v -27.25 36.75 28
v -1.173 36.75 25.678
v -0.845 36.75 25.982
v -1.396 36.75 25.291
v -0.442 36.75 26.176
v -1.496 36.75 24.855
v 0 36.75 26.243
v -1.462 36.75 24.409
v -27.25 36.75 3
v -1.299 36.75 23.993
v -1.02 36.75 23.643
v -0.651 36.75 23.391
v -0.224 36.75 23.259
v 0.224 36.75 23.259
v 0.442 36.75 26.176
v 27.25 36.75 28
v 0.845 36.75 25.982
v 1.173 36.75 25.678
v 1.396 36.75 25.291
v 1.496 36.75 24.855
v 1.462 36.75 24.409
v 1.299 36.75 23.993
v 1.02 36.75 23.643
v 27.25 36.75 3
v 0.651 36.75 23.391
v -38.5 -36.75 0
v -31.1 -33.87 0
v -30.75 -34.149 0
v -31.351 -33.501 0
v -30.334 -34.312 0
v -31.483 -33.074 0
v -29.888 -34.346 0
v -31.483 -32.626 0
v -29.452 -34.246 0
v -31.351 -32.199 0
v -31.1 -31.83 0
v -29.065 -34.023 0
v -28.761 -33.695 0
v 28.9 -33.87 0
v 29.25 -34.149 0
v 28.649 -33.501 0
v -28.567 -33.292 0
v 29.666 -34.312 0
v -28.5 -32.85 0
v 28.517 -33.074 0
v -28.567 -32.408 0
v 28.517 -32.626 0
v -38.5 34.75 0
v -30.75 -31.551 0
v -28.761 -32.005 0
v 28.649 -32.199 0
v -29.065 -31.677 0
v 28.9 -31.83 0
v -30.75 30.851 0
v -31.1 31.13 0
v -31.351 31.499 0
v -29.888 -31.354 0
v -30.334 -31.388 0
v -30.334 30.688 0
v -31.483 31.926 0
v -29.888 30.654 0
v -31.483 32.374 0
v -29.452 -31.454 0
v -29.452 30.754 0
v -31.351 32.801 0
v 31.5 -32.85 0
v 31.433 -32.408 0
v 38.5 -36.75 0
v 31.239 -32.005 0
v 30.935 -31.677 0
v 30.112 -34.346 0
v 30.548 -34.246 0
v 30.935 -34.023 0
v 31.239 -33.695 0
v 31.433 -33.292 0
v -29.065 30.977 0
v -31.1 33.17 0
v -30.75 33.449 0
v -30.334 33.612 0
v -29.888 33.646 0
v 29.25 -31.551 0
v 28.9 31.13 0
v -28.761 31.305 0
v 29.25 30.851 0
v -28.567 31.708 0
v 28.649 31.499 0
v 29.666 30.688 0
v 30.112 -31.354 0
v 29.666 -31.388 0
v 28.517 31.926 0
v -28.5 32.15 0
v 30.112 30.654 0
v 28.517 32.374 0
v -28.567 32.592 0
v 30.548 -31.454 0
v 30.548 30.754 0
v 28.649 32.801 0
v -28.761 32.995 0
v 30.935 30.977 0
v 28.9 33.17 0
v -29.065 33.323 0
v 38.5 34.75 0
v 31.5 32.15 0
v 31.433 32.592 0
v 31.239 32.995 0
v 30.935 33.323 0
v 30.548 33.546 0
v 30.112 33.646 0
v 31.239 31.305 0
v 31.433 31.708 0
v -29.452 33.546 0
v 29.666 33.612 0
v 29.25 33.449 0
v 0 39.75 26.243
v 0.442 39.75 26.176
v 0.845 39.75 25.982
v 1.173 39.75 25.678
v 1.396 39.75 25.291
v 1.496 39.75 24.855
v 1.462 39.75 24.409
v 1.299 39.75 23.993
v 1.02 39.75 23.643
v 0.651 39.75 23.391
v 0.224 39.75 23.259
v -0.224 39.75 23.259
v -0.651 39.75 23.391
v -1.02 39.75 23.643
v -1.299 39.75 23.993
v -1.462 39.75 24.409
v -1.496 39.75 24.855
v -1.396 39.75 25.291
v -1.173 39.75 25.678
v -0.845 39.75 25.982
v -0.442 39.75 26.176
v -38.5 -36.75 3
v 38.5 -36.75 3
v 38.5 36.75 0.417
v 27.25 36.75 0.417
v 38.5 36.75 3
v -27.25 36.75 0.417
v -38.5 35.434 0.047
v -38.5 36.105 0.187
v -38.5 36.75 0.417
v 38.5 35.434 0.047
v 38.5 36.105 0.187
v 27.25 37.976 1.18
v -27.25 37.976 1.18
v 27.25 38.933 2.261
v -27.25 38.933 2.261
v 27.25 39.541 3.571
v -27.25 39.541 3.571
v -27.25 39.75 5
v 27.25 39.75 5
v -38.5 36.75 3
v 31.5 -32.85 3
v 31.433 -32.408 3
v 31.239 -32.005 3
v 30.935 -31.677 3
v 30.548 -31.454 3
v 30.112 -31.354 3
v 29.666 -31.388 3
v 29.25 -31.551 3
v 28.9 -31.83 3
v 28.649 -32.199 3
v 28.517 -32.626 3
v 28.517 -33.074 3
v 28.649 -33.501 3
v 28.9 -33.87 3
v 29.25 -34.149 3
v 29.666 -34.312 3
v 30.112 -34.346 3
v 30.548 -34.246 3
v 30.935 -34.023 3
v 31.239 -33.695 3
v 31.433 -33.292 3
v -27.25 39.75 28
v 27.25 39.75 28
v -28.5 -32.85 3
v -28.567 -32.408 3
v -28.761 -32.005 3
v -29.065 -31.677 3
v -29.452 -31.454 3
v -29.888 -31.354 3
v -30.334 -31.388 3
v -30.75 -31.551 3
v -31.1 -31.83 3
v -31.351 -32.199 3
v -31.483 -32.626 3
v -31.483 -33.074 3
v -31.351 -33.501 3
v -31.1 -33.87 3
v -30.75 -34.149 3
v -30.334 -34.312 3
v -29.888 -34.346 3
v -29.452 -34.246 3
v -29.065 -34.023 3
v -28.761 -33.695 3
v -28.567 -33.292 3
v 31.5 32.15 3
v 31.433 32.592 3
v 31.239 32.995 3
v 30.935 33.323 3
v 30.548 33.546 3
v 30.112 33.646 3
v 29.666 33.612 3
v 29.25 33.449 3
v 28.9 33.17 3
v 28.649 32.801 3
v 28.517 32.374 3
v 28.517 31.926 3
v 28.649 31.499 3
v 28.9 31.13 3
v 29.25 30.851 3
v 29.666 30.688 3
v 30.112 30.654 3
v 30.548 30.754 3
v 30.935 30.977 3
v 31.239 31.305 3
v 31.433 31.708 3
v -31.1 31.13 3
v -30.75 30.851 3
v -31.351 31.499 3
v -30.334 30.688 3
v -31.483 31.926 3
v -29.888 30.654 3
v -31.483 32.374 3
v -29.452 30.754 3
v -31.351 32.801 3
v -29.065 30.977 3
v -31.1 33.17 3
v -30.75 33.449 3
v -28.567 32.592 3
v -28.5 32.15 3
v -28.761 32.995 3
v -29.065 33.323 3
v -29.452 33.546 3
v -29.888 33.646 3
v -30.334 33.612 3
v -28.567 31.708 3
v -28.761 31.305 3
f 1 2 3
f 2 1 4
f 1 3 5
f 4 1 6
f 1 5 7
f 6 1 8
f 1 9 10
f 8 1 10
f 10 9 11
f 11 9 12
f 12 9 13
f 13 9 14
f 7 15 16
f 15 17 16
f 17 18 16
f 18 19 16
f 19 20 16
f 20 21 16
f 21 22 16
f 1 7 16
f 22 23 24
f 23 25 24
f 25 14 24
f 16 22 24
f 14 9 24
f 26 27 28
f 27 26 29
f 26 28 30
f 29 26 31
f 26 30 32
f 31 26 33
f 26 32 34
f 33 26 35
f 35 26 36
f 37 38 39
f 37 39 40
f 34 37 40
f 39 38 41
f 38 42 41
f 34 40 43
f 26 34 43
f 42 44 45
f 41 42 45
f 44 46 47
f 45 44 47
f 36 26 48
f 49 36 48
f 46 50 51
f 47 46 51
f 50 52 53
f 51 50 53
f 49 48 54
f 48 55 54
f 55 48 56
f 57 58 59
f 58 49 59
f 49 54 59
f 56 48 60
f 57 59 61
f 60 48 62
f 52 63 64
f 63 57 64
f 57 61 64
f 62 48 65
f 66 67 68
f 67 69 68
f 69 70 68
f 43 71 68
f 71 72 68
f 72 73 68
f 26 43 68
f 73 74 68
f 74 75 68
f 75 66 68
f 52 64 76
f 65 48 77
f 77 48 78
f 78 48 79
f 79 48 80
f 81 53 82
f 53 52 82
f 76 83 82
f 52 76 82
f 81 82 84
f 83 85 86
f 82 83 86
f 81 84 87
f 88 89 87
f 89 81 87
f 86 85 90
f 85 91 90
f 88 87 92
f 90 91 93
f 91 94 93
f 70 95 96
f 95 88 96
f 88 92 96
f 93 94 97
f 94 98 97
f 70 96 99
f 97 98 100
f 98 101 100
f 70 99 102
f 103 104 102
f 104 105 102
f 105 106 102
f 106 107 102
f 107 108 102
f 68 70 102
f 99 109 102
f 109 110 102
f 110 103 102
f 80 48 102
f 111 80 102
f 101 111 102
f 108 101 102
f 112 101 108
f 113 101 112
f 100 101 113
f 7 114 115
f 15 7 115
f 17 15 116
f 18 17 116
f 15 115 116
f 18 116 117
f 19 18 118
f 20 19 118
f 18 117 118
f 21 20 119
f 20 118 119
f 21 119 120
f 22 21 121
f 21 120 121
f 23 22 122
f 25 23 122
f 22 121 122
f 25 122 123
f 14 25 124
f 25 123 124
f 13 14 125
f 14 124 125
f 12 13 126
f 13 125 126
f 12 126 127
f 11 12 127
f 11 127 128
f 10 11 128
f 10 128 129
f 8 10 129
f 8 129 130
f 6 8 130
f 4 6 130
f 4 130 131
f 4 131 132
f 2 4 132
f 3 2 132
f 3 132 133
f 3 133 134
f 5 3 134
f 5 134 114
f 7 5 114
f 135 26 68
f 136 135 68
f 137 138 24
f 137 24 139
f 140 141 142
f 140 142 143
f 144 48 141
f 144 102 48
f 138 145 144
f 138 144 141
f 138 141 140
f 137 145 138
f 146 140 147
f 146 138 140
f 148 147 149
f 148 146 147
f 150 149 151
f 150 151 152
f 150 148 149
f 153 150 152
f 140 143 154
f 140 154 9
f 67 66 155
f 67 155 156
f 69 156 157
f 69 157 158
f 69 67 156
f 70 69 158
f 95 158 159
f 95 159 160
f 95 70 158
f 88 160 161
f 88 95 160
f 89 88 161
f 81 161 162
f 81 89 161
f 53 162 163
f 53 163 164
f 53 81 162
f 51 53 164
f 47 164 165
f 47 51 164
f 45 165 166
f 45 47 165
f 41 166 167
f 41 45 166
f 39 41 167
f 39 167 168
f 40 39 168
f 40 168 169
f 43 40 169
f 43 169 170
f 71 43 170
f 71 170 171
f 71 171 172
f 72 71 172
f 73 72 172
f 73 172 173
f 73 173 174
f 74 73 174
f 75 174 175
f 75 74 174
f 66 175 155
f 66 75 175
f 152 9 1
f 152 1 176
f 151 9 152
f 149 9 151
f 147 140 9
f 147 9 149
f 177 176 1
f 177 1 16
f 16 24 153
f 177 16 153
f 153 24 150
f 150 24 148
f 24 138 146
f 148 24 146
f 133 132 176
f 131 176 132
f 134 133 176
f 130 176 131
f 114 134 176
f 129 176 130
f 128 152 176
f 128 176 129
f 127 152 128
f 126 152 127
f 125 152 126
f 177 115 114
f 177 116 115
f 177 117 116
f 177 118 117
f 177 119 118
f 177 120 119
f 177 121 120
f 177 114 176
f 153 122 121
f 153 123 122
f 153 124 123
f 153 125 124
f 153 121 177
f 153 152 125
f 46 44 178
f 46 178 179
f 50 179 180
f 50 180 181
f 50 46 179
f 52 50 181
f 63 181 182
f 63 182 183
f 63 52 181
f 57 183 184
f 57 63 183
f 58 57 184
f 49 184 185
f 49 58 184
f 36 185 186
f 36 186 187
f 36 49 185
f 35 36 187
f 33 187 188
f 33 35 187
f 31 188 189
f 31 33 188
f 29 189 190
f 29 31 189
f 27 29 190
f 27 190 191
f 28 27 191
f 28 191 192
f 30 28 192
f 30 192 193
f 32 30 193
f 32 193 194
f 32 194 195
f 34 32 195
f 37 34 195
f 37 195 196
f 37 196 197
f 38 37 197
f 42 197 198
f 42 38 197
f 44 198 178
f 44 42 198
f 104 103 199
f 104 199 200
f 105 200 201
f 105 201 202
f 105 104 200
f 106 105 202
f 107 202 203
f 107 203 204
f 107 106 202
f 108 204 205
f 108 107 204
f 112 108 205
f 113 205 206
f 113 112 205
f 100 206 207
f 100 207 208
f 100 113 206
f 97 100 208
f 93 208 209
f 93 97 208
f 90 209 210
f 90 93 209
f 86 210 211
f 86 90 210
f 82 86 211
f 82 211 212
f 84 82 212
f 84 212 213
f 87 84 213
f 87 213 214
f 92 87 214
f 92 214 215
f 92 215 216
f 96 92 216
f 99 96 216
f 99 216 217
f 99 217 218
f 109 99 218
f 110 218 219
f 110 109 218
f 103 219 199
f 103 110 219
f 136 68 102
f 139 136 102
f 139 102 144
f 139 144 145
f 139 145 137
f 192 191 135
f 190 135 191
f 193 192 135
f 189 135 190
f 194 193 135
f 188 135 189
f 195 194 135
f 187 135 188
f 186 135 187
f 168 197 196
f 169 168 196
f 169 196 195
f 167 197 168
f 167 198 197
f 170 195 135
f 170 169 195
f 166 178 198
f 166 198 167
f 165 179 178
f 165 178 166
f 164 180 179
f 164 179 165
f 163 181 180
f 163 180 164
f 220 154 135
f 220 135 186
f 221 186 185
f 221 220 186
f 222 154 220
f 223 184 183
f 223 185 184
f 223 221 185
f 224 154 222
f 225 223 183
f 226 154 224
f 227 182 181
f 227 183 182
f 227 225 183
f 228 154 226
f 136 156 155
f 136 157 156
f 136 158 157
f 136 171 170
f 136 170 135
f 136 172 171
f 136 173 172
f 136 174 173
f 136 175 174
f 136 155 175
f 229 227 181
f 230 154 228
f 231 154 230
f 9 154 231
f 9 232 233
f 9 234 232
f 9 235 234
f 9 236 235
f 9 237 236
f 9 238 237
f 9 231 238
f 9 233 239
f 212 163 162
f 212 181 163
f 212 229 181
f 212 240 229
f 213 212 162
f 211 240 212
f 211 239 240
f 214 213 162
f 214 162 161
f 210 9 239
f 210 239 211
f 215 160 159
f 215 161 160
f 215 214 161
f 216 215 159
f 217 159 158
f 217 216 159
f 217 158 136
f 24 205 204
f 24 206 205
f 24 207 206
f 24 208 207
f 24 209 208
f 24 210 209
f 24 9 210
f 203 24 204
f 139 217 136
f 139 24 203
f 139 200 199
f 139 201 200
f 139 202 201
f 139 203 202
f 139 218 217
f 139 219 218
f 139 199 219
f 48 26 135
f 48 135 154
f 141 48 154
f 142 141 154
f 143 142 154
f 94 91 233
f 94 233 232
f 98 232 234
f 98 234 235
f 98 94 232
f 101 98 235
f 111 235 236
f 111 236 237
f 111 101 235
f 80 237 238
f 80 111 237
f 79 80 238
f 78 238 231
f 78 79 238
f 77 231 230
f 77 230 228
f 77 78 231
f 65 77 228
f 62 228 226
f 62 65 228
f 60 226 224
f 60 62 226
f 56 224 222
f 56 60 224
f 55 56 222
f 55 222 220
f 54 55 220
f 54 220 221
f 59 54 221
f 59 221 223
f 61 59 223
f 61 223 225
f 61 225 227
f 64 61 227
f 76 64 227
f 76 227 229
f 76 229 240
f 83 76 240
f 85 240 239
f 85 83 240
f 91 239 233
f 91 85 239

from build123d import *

# Parameters (mm, degrees)
ESQUISSE1_W             = 77
ESQUISSE1_H             = 73.5
ESQUISSE1_R             = 1.5
BOSS_EXTRU_1_DEPTH      = 3
ESQUISSE45_W            = 54.5
ESQUISSE45_H            = 3
BOSS_EXTRU_2_DEPTH      = 3
ESQUISSE46_W            = 54.5
ESQUISSE46_H            = 3
BOSS_EXTRU_3_DEPTH      = 25
CONG_1_R                = 5
ESQUISSE47_R            = 1.5
ENL_V_MAT_EXTRU_2_DEPTH = 25


with BuildPart() as part:
    # Esquisse1 → Boss.-Extru.1 (new body)
    with BuildSketch(Plane.XY):
        Rectangle(ESQUISSE1_W, ESQUISSE1_H)
        with Locations((30, 32.15)):
            Circle(ESQUISSE1_R, mode=Mode.SUBTRACT)
        with Locations((30, -32.85)):
            Circle(ESQUISSE1_R, mode=Mode.SUBTRACT)
        with Locations((-30, -32.85)):
            Circle(ESQUISSE1_R, mode=Mode.SUBTRACT)
        with Locations((-30, 32.15)):
            Circle(ESQUISSE1_R, mode=Mode.SUBTRACT)
    extrude(amount=BOSS_EXTRU_1_DEPTH)

    # Esquisse45 → Boss.-Extru.2 (add)
    with BuildSketch(Plane(origin=(0, 36.75, 0), x_dir=(1, 0, 0), z_dir=(0, 1, 0))):
        with Locations((0, -1.5)):
            Rectangle(ESQUISSE45_W, ESQUISSE45_H)
    extrude(amount=BOSS_EXTRU_2_DEPTH)

    # Esquisse46 → Boss.-Extru.3 (add)
    with BuildSketch(Plane.XY.offset(3)):
        with Locations((0, 38.25)):
            Rectangle(ESQUISSE46_W, ESQUISSE46_H)
    extrude(amount=BOSS_EXTRU_3_DEPTH)

    # Congé1
    cong_1_edges = [part.edges().sort_by_distance(p)[0] for p in [
        (0, 39.75, 0),
    ]]
    fillet(cong_1_edges, radius=CONG_1_R)

    # Esquisse47 → Enlèv. mat.-Extru.2 (cut)
    with BuildSketch(Plane(origin=(0, 39.75, 0), x_dir=(1, 0, 0), z_dir=(0, 1, 0))):
        with Locations(Location((0, -24.742583048, 0), (0, 0, 270))):
            Circle(ESQUISSE47_R)
    extrude(amount=-ENL_V_MAT_EXTRU_2_DEPTH, mode=Mode.SUBTRACT)


solid = part.part
